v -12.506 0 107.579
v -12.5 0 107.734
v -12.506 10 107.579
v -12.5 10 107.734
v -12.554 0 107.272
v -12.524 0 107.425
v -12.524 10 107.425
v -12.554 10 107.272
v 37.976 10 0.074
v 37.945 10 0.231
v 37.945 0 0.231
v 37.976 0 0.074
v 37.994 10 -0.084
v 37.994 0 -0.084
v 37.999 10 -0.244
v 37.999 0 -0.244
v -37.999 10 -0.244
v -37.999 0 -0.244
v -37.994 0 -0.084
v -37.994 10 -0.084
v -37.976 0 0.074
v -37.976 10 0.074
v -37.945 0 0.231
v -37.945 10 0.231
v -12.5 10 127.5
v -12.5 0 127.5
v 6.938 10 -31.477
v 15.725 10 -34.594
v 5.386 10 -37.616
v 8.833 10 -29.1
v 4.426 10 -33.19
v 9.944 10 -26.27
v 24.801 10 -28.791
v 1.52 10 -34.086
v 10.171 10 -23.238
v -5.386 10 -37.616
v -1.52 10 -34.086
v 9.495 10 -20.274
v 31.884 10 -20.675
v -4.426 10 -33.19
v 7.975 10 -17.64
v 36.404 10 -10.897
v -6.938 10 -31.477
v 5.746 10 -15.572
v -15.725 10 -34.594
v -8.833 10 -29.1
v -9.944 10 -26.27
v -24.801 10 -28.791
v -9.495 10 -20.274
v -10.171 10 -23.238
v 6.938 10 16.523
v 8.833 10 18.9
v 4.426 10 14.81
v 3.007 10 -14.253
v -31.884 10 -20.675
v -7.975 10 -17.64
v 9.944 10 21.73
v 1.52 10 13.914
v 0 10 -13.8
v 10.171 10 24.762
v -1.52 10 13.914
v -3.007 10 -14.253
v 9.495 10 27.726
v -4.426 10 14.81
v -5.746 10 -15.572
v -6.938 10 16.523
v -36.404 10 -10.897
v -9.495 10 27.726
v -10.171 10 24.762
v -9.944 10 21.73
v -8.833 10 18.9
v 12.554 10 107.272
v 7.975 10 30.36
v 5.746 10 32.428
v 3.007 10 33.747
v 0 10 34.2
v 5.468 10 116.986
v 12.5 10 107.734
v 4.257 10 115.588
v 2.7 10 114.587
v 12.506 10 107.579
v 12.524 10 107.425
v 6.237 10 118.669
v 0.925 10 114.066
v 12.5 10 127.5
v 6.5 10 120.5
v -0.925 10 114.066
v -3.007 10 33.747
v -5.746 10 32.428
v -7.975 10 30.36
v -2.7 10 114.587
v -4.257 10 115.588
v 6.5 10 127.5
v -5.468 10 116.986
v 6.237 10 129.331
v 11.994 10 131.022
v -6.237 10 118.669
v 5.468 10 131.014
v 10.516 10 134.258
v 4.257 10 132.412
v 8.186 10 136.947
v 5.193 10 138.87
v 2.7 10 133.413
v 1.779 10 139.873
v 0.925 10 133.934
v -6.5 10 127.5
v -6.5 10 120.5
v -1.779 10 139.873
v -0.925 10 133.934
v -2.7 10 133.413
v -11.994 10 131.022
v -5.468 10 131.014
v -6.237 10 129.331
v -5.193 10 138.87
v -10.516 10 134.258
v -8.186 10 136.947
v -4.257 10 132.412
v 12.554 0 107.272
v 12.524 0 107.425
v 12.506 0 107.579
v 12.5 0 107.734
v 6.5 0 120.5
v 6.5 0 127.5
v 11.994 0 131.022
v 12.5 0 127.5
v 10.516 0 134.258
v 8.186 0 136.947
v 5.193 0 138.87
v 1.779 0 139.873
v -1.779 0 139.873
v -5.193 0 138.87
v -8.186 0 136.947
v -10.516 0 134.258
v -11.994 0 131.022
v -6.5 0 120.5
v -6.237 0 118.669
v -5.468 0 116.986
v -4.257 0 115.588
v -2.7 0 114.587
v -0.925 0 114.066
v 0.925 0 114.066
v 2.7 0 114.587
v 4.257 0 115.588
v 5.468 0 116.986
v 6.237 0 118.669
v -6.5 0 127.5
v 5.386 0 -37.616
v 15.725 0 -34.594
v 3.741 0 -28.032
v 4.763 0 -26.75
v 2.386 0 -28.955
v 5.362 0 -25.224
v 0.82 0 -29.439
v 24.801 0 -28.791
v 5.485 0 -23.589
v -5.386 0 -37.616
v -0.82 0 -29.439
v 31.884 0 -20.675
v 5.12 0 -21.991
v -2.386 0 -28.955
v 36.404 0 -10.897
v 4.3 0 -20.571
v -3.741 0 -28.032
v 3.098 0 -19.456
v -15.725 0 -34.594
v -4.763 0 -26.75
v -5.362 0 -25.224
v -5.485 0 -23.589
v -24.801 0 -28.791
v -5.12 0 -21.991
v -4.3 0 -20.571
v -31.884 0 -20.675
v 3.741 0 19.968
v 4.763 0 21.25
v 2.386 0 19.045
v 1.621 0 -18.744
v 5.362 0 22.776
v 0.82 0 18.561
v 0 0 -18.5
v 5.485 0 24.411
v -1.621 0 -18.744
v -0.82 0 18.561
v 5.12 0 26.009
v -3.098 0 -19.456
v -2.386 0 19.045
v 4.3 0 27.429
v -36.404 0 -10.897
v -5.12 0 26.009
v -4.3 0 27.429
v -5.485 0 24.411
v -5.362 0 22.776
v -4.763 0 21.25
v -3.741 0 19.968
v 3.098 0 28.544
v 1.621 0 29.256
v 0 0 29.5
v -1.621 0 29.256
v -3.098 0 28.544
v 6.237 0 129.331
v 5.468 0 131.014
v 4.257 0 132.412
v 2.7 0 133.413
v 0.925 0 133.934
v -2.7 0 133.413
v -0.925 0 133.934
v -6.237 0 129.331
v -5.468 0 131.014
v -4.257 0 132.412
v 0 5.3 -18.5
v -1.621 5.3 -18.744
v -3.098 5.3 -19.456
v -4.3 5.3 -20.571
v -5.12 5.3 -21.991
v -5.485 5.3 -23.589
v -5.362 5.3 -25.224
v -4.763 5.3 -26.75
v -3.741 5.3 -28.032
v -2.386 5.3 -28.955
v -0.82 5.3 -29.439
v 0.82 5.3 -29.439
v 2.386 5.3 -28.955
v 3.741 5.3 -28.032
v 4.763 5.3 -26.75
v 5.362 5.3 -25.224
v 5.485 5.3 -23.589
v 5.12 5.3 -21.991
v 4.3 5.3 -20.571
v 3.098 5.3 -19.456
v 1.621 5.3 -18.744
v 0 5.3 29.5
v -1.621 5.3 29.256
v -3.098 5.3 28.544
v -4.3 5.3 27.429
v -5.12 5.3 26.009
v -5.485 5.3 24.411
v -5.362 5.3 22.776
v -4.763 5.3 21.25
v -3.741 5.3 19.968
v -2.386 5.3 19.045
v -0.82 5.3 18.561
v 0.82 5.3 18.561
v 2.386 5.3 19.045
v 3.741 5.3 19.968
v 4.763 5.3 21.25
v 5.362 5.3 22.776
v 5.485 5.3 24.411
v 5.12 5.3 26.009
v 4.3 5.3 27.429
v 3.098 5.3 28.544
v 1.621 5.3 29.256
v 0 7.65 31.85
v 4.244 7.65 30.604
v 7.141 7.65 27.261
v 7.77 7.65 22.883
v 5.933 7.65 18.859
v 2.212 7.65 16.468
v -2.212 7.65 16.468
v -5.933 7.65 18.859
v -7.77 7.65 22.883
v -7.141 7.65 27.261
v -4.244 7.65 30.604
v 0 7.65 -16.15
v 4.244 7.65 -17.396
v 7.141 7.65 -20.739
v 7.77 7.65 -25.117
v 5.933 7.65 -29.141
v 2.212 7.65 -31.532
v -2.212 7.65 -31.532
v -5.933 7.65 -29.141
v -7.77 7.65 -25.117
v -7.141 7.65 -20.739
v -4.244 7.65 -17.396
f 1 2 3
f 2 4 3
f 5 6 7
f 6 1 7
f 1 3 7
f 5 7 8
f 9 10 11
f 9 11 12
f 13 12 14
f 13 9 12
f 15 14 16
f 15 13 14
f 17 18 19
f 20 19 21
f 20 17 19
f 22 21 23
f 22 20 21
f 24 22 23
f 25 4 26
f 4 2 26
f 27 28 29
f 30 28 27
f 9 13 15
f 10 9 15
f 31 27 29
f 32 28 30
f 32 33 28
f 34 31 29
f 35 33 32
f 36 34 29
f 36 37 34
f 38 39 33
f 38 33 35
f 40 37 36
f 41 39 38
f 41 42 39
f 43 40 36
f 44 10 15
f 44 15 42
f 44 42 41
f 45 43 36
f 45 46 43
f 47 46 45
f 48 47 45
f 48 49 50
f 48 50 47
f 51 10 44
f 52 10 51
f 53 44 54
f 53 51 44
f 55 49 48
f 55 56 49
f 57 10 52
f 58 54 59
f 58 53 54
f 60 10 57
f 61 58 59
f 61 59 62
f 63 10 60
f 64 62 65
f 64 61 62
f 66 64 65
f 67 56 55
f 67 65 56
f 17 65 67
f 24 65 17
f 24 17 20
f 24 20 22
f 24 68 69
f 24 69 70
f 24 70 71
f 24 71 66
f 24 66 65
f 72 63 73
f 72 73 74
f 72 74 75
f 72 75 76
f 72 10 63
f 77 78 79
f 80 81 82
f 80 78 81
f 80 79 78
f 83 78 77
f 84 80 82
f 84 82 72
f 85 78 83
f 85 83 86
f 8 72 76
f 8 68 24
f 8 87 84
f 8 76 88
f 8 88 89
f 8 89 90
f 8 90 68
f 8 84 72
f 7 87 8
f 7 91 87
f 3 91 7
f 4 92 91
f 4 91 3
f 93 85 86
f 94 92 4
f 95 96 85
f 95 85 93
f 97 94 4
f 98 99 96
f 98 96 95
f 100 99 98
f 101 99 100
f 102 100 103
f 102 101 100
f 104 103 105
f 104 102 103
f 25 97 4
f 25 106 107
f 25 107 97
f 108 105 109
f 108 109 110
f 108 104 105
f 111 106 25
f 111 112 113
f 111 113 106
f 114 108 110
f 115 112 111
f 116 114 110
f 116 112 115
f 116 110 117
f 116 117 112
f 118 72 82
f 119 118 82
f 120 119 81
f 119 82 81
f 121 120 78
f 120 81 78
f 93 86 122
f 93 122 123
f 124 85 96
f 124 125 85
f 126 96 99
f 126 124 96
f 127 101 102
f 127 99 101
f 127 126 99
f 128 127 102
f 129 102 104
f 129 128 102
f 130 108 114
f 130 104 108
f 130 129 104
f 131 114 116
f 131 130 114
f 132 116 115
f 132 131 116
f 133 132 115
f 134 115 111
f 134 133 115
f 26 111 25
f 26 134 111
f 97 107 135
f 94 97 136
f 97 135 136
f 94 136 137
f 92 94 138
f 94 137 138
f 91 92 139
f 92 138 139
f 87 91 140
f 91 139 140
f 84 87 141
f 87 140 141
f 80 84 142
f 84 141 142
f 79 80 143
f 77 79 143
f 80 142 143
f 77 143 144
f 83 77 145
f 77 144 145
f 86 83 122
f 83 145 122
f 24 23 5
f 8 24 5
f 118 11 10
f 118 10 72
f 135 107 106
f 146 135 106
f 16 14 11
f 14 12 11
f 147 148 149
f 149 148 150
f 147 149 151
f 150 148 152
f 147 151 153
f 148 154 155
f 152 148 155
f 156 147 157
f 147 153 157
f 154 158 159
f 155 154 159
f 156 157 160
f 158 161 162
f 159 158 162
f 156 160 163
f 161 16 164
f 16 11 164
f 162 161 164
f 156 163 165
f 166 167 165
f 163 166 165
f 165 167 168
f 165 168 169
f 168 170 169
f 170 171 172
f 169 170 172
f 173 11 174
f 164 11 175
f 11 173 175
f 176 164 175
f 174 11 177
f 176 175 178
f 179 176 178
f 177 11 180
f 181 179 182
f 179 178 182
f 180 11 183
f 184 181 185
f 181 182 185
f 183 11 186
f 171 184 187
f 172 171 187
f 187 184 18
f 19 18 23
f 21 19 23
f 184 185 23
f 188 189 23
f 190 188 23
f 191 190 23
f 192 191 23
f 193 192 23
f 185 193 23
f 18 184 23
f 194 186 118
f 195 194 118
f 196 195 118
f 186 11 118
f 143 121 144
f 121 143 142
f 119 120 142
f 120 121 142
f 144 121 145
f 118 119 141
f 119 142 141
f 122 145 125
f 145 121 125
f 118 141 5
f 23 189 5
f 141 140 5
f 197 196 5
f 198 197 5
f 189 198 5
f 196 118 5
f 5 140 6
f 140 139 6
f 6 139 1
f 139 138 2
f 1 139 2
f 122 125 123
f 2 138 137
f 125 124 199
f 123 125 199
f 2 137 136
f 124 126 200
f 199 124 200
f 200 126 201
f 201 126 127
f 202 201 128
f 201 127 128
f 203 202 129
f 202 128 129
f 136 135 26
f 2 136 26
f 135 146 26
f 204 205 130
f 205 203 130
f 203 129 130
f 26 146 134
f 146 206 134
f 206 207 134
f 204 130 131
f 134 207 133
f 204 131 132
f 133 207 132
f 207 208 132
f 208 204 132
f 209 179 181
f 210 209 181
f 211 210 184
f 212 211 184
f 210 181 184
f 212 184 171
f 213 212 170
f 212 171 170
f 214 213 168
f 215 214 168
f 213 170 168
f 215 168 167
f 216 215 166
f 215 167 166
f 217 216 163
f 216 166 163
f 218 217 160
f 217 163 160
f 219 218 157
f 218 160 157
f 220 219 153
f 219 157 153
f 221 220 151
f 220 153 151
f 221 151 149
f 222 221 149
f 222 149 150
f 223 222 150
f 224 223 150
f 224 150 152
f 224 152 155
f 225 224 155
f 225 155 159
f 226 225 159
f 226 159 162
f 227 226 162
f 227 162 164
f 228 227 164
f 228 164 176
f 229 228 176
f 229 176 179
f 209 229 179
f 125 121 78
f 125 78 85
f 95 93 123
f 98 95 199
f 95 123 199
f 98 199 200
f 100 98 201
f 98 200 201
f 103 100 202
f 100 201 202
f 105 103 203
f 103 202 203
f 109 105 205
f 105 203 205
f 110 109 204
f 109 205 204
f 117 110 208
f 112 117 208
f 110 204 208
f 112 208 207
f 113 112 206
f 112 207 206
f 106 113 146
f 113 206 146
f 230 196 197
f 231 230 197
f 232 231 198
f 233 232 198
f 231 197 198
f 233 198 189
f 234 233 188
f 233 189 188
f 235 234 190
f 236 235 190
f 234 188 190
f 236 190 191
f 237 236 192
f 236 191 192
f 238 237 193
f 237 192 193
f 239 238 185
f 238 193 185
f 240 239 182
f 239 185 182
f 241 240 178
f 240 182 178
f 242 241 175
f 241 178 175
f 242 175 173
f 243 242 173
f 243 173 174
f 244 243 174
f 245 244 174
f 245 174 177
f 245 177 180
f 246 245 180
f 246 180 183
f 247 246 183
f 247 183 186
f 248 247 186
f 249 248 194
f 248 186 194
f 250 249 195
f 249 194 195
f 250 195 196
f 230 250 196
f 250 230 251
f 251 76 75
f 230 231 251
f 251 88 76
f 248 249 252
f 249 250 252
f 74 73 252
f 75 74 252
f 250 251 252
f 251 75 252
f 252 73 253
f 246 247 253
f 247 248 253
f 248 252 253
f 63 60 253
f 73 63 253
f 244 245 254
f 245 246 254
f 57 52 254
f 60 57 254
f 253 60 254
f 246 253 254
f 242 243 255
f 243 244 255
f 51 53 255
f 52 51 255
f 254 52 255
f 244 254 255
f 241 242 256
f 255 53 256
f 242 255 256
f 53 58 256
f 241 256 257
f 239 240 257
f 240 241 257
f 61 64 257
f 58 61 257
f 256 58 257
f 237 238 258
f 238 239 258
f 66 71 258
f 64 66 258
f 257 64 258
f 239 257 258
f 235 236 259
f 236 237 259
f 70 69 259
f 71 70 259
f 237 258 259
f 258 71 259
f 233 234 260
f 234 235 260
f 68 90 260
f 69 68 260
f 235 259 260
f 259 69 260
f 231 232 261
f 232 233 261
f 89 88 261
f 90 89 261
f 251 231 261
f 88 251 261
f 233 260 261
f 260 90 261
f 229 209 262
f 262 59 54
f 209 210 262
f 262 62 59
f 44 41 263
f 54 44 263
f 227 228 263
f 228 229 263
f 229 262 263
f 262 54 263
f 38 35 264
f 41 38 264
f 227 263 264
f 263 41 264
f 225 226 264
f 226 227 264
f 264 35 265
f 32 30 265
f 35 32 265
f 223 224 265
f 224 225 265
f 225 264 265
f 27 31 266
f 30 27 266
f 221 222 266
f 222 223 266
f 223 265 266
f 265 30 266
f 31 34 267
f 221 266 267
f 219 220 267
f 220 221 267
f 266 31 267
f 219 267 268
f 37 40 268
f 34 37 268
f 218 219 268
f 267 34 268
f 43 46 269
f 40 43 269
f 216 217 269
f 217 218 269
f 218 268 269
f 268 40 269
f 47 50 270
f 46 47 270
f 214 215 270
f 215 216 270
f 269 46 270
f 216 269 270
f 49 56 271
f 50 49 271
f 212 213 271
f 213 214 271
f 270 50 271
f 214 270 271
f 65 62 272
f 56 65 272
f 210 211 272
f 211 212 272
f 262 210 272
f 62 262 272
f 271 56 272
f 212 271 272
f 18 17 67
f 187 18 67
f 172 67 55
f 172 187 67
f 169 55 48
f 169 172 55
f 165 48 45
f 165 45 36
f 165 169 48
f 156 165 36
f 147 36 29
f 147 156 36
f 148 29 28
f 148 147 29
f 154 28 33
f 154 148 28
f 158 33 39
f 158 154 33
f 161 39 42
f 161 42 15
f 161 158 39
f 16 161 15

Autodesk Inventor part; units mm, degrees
ref_plane "YZ Plane" through (0, 0, 0) normal (1, 0, 0) x (0, 1, 0)
ref_plane "XZ Plane" through (0, 0, 0) normal (0, 1, 0) x (-1, 0, 0)
ref_plane "XY Plane" through (0, 0, 0) normal (0, 0, 1) x (1, 0, 0)
sketch "Эскиз1" plane through (0, 0, 0) normal (0, 1, 0) x (-1, 0, 0)
  arc A0 (-38, 0) -> (38, 0) centre (0, 0) ccw
  line L0 (53.2, 0) -> (-53.2, 0) projected
  line L1 (38, 0) -> (12.5, 107.5)
  line L2 (-38, 0) -> (-12.5, 107.5)
  line L3 (-12.5, 107.5) -> (-12.5, 127.5)
  line L4 (12.5, 107.5) -> (12.5, 127.5)
  arc A1 (12.5, 127.5) -> (-12.5, 127.5) centre (0, 127.5) ccw
  line L5 (0, -73.6) -> (0, 175.6) projected
  line L6 (6.5, 120.5) -> (6.5, 127.5)
  line L7 (-6.5, 120.5) -> (-6.5, 127.5)
  arc A2 (-6.5, 120.5) -> (6.5, 120.5) centre (0, 120.5) ccw
  arc A3 (6.5, 127.5) -> (-6.5, 127.5) centre (0, 127.5) ccw
  dimension "d1" = 76
  dimension "d2" = 25
  dimension "d3" = 20
  dimension "d4" = 127.5
  dimension "d5" = 7
  dimension "d6" = 13
extrude "Выдавливание1" add sketch "Эскиз1" along normal blind 10 contours L0 L5 A0 | L2 L3 A1 L5 A3 L7 A2 L0 | L5 L0 A0 | L5 A2 L6 A3 A1 L4 L1 L0
sketch "Эскиз2" plane through (0, 10, 0) normal (0, 1, 0) x (1, 0, 0)
  point P0 (0, 0)
  point P1 (0, 24)
  point P2 (0, -24)
  dimension "d9" = 24
  dimension "d10" = 48
hole "Отверстие1" at (0, 10, -24) at (0, 10, 24) direction (0, -1, 0) diameter 11 end through all countersink diameter 20.4 countersink angle 90 clearance for "с потайной головкой ГОСТ 12876-67" size "M10" standard "ГОСТ"
fillet "Сопряжение1" radius 2 4 edges at (12.5, 5, 107.5) (38, 5, 0) (-12.5, 5, 107.5) (-38, 5, 0)
properties part number "Рычаг"
